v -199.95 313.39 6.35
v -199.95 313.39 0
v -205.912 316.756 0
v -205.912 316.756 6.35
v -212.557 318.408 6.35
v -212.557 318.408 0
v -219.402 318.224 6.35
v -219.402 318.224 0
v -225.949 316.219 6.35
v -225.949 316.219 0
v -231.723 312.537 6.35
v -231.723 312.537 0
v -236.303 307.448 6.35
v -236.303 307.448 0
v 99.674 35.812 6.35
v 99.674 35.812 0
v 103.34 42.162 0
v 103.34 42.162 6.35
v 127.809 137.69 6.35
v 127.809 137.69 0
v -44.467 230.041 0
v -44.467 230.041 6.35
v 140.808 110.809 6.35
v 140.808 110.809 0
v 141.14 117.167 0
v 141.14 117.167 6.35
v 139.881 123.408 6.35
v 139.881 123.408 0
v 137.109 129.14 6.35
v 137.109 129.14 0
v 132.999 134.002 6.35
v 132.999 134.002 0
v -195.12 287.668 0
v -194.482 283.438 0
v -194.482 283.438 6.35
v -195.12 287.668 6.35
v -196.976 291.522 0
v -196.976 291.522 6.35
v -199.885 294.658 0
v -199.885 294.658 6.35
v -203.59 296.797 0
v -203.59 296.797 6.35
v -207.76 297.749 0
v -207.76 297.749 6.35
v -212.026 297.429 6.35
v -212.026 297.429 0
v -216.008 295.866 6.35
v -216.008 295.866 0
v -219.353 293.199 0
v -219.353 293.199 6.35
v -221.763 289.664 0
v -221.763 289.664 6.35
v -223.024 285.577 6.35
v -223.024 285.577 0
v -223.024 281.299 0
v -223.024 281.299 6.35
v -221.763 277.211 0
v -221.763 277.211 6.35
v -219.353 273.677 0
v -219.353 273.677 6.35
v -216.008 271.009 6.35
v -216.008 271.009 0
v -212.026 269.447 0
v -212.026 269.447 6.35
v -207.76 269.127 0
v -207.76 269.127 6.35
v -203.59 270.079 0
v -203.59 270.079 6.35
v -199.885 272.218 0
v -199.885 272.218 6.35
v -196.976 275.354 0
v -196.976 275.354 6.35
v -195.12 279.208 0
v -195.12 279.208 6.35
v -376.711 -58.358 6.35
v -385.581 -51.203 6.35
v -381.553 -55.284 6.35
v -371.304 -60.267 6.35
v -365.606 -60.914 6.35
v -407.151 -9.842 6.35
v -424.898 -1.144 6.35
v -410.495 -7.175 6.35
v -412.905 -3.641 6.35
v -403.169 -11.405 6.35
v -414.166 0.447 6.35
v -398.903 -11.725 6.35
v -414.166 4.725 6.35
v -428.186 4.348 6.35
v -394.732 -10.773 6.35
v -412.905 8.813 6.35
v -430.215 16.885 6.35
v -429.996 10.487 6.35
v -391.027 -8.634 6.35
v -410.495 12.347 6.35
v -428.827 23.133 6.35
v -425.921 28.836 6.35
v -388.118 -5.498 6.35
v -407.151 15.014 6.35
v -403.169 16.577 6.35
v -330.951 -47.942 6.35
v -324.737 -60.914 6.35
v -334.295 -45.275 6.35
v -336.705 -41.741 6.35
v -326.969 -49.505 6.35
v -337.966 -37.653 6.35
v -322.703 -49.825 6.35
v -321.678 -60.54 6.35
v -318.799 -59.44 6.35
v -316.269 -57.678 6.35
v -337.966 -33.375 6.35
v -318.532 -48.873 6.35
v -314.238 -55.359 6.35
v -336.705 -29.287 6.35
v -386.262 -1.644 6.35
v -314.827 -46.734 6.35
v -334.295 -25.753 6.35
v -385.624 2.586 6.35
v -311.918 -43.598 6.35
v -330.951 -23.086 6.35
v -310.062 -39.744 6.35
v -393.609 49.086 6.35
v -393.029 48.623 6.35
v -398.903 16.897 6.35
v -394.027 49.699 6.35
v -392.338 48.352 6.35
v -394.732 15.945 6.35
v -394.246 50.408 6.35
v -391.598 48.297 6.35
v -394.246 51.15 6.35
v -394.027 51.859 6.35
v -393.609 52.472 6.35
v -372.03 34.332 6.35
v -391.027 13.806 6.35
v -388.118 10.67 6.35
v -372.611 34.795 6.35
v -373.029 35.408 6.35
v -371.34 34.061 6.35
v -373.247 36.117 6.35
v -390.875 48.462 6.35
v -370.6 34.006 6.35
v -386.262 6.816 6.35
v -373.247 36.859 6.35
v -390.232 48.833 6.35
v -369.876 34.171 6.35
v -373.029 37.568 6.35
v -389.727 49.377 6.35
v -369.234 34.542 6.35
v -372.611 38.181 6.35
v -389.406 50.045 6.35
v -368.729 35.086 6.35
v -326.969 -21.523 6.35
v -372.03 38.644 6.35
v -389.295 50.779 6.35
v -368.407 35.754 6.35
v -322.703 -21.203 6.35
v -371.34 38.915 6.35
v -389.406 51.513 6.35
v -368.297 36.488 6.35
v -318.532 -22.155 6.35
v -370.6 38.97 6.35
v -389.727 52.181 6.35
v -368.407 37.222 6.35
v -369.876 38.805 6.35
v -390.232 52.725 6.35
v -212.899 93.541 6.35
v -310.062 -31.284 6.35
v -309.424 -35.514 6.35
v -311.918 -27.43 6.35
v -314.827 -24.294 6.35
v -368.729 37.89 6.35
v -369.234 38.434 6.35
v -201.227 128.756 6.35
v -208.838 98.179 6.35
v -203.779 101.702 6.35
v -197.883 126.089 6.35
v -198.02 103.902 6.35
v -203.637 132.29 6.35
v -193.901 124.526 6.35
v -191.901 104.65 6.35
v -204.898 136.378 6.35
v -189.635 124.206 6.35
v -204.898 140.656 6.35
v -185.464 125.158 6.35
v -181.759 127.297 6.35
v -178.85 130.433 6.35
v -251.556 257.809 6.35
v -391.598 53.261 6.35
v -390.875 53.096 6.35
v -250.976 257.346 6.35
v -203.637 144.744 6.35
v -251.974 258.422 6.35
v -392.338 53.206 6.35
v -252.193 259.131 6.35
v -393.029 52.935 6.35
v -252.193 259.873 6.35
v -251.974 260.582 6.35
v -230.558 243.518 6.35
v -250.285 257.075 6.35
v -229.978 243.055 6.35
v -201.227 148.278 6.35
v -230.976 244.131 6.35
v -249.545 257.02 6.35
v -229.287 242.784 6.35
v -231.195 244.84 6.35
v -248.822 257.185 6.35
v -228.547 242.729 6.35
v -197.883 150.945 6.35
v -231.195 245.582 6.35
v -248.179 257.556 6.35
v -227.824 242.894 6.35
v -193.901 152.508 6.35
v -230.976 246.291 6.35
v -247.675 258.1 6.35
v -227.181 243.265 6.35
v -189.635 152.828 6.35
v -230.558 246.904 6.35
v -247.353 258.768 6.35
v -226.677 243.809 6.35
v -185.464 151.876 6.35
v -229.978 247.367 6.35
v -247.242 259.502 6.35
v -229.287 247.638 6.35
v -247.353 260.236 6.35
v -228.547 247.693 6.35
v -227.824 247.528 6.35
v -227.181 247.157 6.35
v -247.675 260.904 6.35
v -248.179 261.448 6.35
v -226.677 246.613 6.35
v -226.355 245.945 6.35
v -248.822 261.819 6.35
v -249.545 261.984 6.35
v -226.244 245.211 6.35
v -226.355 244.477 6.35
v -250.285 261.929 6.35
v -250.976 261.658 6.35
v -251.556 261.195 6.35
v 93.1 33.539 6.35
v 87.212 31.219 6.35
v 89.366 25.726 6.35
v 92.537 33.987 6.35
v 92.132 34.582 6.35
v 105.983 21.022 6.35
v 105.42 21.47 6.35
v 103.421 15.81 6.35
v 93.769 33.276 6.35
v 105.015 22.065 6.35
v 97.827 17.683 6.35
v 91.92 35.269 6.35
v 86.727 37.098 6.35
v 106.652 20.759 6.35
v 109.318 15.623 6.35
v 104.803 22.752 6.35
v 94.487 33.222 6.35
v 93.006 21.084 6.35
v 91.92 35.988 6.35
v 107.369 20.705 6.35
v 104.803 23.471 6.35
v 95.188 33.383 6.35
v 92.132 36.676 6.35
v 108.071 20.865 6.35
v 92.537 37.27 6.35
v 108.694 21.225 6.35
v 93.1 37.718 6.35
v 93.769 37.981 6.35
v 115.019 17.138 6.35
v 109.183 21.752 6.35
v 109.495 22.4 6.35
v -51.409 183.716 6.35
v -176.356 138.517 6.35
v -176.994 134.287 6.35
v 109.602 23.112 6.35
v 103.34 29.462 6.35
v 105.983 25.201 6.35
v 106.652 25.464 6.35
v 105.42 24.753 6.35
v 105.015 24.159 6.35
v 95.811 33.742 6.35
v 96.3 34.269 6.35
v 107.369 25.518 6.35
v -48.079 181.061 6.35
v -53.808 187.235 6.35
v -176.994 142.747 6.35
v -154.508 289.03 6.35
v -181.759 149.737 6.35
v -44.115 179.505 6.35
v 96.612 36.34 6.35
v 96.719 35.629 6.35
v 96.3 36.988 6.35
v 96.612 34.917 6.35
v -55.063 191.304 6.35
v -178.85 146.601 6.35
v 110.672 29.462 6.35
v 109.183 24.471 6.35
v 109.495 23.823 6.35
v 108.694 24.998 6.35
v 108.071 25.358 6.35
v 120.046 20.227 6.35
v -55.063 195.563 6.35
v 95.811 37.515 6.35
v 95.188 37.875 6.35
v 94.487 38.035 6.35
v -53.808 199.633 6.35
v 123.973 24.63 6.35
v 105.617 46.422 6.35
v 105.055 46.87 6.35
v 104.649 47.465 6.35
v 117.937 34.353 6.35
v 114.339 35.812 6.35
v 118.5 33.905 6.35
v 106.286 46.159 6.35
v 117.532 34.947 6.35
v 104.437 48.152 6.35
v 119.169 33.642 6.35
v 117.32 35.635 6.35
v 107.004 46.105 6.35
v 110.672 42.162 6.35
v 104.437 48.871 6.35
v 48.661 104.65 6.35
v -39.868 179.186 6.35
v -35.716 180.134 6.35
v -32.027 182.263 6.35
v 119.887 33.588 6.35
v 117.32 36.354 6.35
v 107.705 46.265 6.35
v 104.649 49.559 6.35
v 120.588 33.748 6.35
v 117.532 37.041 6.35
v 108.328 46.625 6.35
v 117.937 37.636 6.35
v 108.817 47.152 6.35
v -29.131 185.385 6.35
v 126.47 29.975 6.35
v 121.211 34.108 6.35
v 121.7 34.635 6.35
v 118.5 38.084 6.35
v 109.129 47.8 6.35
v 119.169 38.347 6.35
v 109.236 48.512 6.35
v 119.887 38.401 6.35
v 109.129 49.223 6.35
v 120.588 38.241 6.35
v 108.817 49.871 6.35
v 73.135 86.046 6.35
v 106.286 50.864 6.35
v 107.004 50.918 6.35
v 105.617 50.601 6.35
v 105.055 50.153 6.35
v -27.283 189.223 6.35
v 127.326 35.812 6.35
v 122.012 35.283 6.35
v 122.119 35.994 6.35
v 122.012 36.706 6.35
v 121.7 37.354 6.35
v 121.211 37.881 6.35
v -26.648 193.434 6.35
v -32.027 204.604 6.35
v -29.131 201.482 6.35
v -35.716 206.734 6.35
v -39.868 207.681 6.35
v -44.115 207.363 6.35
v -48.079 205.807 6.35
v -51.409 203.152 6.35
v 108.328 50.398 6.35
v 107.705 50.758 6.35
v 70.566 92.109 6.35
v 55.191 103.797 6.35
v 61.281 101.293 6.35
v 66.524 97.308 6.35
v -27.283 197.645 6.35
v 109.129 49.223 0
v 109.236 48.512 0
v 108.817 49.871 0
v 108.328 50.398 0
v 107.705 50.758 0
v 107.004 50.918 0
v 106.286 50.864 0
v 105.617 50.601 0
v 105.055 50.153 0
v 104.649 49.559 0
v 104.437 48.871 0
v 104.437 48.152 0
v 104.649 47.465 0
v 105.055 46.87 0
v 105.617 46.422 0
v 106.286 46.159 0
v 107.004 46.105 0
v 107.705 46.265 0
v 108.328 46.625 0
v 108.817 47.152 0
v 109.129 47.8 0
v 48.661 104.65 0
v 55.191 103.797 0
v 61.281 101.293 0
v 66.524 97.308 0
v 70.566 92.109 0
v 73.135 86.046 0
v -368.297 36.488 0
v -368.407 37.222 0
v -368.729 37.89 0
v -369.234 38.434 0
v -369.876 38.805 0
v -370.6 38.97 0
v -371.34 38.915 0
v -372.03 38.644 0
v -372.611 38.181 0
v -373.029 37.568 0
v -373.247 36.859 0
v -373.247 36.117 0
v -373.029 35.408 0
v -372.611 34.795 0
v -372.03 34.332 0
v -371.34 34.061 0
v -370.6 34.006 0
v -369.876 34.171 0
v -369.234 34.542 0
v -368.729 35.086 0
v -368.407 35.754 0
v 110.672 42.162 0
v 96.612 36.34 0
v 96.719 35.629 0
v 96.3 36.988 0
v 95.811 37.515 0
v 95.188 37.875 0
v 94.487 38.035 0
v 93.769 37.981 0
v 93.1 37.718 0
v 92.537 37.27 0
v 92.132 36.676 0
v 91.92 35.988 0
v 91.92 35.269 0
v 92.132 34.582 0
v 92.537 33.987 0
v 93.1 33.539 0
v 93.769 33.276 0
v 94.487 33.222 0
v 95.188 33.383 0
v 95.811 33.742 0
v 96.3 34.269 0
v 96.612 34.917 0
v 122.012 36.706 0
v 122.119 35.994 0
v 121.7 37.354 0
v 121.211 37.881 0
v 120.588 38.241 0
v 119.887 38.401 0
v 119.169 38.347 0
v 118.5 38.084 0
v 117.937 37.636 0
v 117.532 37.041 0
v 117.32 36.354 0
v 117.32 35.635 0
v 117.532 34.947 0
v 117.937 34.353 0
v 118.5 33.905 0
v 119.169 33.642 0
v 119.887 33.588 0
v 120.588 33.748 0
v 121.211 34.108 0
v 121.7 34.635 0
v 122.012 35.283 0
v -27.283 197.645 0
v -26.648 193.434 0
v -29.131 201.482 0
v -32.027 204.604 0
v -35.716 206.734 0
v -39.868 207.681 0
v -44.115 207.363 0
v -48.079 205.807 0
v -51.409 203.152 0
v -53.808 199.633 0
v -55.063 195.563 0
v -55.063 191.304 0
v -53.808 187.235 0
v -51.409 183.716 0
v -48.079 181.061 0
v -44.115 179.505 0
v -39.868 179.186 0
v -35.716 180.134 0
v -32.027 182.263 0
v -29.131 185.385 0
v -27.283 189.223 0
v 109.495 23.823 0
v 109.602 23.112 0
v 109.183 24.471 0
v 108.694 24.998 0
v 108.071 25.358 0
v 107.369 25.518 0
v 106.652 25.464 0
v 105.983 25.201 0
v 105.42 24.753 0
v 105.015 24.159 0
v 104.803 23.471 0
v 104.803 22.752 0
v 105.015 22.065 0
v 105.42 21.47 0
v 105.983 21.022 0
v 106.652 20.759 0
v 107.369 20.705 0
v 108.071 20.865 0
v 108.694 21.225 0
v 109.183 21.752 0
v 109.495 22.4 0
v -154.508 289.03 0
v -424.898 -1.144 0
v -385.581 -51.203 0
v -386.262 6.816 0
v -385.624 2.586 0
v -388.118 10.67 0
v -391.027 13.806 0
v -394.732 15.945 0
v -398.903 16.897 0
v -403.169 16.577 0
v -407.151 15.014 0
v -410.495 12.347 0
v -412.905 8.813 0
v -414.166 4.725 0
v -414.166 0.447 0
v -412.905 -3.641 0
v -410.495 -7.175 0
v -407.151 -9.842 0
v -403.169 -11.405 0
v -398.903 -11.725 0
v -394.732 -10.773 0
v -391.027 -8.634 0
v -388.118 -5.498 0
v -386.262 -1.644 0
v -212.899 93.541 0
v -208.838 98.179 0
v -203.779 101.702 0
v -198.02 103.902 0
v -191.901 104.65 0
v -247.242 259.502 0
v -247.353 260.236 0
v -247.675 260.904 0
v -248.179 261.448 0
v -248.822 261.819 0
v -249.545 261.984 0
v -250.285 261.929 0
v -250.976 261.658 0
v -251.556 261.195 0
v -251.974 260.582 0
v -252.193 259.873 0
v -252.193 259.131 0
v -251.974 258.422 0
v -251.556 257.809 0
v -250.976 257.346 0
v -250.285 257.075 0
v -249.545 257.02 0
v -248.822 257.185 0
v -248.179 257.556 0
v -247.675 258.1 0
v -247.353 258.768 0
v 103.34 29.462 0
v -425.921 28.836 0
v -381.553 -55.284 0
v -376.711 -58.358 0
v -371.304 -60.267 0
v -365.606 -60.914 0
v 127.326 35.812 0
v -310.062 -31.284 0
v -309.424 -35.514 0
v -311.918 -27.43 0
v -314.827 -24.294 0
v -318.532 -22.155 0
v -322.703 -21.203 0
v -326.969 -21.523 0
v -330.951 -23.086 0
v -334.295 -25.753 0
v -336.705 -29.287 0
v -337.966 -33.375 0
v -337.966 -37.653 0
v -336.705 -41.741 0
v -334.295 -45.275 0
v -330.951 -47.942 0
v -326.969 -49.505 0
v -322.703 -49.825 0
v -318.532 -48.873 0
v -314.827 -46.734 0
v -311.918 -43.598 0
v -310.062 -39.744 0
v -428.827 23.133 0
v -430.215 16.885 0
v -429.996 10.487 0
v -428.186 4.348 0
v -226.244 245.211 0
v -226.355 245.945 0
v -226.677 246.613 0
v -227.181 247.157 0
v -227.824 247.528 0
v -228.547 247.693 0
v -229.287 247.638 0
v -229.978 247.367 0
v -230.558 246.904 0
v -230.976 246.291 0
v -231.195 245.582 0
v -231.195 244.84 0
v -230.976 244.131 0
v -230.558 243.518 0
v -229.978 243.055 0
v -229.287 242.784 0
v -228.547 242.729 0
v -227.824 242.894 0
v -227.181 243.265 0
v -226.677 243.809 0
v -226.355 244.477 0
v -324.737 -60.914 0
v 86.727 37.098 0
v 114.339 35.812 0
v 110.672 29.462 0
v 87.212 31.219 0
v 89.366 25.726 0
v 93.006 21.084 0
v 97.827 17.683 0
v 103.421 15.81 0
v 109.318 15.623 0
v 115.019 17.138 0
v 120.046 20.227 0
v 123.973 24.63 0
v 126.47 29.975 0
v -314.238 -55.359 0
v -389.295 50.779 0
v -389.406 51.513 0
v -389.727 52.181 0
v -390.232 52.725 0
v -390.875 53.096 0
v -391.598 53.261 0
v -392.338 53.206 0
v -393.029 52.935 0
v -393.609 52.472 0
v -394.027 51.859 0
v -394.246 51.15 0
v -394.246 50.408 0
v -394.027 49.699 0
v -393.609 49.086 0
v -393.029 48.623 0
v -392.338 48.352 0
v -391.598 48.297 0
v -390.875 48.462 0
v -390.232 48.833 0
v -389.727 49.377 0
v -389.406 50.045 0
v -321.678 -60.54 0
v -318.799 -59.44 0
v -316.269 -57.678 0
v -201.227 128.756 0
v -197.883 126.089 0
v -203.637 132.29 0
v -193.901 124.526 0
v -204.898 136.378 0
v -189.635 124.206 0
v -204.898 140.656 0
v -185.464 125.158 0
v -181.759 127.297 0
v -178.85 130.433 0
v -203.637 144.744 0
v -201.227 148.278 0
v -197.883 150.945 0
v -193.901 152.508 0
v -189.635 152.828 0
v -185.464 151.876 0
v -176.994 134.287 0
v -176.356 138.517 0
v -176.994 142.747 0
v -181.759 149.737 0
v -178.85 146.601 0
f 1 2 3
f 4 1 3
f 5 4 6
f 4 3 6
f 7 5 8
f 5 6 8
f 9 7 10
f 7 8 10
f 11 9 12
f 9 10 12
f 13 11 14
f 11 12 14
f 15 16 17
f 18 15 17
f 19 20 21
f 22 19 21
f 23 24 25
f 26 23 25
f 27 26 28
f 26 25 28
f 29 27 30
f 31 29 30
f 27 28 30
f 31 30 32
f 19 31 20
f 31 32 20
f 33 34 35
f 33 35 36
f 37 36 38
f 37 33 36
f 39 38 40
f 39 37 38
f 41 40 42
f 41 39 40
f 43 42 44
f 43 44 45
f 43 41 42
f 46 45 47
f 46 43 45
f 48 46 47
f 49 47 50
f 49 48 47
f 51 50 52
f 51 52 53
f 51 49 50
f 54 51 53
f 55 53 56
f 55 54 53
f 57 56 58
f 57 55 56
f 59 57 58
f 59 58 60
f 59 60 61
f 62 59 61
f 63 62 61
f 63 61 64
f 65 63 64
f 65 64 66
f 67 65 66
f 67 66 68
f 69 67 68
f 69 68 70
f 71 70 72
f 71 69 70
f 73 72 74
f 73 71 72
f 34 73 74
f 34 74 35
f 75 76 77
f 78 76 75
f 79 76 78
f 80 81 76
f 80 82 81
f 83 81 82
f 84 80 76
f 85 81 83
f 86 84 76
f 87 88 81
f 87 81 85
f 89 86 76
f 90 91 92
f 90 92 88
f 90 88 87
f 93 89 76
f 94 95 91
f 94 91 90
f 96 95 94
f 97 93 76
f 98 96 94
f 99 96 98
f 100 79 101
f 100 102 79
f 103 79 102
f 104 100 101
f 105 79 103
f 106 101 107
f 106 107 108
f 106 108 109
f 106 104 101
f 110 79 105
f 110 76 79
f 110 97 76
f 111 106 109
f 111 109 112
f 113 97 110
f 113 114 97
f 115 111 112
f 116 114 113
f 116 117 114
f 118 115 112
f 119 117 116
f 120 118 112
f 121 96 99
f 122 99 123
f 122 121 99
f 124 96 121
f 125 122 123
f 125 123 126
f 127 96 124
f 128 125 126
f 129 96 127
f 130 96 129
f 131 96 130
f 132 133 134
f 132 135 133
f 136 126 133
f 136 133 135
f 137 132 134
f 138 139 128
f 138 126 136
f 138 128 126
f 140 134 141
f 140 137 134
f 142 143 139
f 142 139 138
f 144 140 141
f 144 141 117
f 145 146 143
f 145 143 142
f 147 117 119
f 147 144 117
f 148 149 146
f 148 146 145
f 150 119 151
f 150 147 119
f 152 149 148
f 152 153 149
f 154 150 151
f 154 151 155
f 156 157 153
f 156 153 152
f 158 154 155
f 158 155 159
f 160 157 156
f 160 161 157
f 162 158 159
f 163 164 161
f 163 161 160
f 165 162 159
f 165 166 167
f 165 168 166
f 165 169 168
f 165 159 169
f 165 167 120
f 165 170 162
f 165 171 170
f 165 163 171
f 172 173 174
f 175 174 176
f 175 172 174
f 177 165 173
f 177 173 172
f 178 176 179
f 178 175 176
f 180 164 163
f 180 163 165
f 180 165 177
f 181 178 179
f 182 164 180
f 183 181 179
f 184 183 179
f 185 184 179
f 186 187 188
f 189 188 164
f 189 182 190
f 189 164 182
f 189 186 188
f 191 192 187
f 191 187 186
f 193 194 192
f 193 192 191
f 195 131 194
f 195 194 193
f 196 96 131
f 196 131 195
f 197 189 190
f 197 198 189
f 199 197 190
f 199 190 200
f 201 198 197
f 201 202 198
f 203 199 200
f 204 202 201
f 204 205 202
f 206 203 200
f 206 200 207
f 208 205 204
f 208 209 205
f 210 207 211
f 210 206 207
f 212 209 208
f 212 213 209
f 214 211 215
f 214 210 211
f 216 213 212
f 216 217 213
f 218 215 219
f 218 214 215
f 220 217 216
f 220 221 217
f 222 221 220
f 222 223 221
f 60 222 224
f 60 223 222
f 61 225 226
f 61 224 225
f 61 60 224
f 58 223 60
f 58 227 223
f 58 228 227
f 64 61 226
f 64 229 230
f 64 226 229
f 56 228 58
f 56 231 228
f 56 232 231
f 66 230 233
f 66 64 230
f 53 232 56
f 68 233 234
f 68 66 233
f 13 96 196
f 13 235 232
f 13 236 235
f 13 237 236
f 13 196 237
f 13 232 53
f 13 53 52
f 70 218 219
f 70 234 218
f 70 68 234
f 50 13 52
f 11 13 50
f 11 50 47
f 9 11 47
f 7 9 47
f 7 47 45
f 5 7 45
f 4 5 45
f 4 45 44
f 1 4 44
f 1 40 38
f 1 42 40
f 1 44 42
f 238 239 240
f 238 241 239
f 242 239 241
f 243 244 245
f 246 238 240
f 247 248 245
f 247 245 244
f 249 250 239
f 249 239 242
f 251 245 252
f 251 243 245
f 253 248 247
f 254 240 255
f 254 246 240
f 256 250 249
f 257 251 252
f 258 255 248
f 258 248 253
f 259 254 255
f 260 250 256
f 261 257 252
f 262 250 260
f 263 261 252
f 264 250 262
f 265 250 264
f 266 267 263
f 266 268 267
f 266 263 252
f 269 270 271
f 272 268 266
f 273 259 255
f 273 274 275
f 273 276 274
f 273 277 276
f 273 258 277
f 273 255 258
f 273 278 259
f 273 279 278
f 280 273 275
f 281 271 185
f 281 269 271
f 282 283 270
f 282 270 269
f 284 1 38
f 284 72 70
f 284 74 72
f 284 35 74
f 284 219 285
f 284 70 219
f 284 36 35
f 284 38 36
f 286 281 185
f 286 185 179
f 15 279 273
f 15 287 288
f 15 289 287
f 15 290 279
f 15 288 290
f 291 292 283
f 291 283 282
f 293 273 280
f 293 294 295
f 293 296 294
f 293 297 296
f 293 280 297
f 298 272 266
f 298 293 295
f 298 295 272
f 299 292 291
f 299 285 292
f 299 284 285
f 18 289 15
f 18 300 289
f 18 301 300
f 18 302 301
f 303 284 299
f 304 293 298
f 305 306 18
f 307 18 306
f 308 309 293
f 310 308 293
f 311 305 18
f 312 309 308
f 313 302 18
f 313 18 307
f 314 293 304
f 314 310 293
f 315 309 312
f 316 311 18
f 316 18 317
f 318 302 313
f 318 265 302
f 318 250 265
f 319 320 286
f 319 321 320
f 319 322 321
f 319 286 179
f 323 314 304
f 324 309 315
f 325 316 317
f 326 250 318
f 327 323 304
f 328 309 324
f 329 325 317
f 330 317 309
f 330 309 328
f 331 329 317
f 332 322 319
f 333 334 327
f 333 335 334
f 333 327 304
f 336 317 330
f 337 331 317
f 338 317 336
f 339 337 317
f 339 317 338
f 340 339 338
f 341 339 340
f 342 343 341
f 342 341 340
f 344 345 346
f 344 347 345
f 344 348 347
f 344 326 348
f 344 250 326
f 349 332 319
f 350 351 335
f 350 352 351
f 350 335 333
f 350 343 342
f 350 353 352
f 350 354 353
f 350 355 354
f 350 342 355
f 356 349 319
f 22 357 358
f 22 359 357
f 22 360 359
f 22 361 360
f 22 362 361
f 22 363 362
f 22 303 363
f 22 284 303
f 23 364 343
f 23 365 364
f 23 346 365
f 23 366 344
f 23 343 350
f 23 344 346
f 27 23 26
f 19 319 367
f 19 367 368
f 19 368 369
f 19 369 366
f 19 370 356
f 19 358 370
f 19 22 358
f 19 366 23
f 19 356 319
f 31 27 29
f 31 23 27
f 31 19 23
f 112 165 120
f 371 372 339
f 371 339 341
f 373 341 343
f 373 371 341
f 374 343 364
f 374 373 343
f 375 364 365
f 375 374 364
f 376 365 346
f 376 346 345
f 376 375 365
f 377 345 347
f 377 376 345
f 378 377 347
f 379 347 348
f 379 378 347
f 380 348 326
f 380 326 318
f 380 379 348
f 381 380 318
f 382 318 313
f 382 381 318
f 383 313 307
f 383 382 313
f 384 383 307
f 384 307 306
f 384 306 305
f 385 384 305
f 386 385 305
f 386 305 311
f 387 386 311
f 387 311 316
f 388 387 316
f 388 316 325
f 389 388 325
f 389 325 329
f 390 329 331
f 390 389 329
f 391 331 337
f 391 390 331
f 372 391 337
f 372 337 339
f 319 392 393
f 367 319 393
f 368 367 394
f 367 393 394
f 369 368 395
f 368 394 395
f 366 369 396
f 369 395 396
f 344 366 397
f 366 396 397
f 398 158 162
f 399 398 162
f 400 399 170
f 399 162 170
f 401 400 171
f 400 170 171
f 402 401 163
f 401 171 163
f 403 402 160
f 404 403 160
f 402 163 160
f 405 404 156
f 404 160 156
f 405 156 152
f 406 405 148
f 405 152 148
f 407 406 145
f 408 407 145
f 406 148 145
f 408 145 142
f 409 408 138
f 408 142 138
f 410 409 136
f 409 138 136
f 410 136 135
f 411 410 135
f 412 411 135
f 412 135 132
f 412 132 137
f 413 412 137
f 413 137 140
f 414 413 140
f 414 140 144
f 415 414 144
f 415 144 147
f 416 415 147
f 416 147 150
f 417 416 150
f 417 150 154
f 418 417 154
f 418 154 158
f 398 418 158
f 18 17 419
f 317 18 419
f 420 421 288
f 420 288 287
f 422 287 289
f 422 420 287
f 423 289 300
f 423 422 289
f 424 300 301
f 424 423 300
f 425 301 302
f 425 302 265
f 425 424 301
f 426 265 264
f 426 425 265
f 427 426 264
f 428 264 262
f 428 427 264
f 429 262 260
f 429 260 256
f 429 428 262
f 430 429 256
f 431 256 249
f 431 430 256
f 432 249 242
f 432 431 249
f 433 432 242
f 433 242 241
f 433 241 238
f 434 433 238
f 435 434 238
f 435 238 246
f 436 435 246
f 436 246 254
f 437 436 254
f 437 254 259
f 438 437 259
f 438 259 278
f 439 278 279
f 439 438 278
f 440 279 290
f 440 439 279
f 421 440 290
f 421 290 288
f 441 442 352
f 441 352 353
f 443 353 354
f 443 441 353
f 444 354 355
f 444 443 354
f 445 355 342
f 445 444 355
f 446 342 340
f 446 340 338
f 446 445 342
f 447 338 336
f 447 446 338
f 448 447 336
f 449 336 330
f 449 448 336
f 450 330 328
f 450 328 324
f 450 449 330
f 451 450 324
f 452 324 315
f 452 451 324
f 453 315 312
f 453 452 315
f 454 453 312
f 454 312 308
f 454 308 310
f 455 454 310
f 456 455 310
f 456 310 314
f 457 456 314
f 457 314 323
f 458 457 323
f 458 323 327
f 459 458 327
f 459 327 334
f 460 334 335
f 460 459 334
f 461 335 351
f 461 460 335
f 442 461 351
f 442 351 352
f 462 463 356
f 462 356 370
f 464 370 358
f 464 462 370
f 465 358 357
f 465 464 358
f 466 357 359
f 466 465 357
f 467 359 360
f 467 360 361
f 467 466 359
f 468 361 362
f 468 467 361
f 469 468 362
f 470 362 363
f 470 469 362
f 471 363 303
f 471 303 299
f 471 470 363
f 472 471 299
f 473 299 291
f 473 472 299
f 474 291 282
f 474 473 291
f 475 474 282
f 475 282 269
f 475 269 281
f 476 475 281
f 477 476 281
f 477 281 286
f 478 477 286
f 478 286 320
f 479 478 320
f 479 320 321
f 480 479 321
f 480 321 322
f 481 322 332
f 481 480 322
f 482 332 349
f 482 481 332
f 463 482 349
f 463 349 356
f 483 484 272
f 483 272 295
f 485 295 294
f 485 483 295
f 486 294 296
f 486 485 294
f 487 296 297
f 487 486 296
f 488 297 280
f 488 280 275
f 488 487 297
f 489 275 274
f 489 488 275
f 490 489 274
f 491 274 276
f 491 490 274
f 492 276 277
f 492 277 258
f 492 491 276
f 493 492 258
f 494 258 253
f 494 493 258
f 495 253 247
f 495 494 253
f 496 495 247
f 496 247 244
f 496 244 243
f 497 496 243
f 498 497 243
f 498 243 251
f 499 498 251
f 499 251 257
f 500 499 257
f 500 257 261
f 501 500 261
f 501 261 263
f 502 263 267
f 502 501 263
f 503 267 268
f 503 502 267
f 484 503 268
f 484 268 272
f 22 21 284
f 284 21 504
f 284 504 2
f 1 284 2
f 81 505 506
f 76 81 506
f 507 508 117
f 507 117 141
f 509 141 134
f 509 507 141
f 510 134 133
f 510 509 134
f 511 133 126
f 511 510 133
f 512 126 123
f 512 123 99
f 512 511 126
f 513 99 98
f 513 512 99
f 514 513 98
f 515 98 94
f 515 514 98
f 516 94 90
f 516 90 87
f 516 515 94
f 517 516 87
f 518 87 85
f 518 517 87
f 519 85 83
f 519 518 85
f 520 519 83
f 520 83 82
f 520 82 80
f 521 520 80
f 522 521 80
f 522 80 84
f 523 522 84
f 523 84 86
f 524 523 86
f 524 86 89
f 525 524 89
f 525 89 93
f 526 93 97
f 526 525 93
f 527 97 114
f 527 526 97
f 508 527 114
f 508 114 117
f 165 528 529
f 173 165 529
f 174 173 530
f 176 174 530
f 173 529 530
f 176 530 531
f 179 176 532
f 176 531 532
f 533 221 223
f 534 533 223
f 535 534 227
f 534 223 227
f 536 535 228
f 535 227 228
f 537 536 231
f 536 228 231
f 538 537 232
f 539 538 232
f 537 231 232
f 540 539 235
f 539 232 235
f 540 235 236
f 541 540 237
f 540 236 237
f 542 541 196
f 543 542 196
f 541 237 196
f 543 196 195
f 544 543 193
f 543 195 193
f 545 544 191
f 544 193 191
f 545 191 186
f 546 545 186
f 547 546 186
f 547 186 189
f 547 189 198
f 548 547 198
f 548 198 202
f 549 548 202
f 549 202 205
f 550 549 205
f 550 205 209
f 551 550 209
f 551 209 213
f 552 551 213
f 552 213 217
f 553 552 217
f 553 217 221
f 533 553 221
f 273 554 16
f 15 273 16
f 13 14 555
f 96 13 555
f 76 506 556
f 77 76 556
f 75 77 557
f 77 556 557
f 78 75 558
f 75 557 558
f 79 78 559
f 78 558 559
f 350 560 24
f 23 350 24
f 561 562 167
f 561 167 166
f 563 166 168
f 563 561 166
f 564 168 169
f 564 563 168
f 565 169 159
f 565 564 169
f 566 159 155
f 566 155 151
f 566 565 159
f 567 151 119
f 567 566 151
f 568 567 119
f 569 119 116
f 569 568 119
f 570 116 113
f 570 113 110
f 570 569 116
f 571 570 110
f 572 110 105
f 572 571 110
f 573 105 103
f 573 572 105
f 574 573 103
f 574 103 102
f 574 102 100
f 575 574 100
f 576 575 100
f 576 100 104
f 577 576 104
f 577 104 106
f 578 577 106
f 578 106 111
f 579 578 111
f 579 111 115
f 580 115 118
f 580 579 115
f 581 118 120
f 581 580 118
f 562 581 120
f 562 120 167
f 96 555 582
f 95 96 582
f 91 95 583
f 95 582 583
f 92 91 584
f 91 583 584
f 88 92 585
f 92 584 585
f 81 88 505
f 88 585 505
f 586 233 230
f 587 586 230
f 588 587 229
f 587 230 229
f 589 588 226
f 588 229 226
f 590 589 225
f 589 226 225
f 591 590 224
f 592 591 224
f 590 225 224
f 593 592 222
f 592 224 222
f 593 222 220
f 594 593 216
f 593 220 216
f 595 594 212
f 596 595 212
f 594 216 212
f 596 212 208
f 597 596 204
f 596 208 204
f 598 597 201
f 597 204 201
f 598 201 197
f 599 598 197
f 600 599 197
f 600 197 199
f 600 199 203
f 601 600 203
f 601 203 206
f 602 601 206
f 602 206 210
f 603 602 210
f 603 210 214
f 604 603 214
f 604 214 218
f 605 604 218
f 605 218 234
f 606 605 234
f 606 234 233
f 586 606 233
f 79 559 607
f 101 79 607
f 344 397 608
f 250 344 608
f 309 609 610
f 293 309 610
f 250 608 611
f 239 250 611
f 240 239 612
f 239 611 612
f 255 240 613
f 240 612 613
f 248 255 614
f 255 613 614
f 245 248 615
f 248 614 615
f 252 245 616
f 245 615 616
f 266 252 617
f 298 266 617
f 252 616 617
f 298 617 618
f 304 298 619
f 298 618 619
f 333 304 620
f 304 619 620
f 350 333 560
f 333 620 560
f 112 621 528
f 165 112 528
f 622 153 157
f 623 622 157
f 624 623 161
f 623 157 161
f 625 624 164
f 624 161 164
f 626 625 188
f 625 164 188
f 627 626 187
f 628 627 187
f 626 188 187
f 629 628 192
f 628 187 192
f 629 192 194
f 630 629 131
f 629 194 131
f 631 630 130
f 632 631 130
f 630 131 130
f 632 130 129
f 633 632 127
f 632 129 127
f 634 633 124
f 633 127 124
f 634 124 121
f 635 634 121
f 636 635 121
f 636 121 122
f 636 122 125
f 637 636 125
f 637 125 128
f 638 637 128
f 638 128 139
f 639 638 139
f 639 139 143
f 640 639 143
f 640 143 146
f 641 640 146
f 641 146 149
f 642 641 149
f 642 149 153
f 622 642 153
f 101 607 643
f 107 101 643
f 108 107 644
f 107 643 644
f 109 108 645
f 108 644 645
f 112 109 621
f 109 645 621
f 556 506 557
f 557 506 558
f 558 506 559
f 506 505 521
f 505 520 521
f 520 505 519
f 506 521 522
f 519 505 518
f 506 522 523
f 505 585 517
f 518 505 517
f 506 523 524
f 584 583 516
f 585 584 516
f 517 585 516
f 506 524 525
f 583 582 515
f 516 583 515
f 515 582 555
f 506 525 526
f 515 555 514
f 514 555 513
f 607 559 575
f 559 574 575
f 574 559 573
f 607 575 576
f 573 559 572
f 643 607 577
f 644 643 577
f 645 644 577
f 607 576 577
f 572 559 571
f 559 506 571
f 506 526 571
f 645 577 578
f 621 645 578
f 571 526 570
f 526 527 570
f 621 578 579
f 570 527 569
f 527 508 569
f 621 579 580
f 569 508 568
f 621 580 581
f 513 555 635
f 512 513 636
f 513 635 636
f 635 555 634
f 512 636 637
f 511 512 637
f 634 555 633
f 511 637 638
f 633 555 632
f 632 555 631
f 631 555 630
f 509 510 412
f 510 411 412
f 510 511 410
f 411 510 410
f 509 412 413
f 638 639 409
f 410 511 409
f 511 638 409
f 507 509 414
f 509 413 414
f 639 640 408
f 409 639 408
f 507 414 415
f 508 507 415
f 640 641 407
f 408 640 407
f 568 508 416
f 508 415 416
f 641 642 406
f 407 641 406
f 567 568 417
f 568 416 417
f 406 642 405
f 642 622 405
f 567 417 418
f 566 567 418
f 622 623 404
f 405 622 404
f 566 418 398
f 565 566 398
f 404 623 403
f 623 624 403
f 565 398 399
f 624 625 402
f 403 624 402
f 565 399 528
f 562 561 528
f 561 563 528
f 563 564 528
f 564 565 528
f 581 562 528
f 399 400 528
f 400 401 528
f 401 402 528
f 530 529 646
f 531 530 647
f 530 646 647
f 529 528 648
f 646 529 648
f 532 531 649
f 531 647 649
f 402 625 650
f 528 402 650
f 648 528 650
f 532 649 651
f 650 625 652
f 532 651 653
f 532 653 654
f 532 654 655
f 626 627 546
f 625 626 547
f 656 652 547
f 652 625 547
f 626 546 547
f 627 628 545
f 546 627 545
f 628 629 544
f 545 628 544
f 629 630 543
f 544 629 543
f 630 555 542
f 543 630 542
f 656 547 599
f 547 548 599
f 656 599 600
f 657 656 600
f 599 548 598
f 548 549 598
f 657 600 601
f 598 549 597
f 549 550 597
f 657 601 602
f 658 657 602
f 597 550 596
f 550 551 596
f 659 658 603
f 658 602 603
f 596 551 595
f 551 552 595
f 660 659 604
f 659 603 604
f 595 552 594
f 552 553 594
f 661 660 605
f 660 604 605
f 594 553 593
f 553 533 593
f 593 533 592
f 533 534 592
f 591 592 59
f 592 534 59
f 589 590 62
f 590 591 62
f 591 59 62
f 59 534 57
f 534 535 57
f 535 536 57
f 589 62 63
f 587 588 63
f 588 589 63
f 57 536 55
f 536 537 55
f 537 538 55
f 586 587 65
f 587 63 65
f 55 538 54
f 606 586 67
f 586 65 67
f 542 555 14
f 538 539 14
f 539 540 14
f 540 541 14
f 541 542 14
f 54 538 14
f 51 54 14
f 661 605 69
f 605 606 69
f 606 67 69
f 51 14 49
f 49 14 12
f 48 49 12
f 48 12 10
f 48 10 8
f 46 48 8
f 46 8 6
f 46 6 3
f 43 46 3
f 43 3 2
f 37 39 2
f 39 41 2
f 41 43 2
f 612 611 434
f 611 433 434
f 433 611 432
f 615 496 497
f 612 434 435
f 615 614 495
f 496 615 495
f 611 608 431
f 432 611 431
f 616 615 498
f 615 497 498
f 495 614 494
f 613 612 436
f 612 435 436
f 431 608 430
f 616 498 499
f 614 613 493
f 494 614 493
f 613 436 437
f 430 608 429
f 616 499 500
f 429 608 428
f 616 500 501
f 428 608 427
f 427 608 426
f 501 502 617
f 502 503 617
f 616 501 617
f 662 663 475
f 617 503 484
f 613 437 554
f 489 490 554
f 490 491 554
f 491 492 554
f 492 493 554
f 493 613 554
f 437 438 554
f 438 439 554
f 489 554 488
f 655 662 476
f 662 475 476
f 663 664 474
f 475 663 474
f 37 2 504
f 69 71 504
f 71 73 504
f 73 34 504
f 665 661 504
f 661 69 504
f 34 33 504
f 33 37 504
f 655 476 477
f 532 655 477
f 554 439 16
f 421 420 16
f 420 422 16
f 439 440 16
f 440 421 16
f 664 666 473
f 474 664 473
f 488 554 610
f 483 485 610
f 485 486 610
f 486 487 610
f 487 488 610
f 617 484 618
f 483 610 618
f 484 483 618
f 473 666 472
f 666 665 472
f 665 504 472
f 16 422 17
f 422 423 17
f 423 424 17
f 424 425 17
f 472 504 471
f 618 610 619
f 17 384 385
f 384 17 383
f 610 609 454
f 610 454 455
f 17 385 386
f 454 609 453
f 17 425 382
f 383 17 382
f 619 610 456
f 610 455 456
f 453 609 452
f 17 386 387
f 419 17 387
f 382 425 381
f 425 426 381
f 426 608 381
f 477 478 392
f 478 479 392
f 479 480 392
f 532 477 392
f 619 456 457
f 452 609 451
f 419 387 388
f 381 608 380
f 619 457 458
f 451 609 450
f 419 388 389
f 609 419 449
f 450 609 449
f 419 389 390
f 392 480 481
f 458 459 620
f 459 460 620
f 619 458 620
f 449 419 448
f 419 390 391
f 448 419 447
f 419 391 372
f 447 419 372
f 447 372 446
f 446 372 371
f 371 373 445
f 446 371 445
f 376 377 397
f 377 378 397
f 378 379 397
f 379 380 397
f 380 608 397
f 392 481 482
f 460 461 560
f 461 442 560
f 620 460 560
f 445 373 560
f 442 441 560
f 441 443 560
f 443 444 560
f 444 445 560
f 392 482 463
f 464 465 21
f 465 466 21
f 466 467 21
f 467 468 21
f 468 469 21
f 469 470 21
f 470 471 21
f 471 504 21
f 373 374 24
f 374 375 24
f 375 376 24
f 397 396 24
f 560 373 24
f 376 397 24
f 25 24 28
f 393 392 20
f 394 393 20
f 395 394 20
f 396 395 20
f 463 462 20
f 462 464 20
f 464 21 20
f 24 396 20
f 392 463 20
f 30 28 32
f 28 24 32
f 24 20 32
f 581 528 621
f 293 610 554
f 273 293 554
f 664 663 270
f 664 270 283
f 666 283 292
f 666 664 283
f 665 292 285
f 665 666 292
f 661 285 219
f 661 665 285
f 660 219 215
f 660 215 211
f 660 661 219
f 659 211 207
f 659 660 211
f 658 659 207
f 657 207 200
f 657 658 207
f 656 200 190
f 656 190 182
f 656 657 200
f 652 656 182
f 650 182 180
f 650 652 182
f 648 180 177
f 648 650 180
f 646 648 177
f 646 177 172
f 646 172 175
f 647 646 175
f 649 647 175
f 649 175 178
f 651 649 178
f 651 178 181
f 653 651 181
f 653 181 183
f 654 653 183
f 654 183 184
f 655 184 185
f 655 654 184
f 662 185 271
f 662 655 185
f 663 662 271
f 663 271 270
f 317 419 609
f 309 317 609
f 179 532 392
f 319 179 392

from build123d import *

# Parameters (mm, degrees)
MODEL_R             = 14.351
MODEL_R_2           = 2.413
MODEL_R_3           = 14.2875
BOSS_EXTRUDE1_DEPTH = 6.35
CUT_EXTRUDE1_REACH  = 8.35
SKETCH35_R          = 2.4892


with BuildPart() as part:
    # Model → Boss-Extrude1 (new body)
    with BuildSketch(Plane.XY):
        with BuildLine():
            ThreePointArc((-212.899365952, 93.541257838), (-203.778989185, 101.701881024), (-191.901103209, 104.650248016))
            Line((-191.901103209, 104.650248016), (48.661197018, 104.650248016))
            ThreePointArc((48.661197018, 104.650248016), (64.032332507, 99.471232012), (73.135172194, 86.046168785))
            Line((73.135172194, 86.046168785), (86.727013732, 37.098218434))
            ThreePointArc((86.727013732, 37.098218434), (106.36258142, 15.501750179), (127.326236921, 35.811553418))
            Line((127.326236921, 35.811553418), (140.807890588, 110.809453484))
            ThreePointArc((140.807890588, 110.809453484), (138.675228362, 126.361225539), (127.809114585, 137.689660276))
            Line((127.809114585, 137.689660276), (-44.466784077, 230.040741354))
            Line((-44.466784077, 230.040741354), (-154.507929168, 289.02994873))
            Line((-154.507929168, 289.02994873), (-199.949582693, 313.389629113))
            ThreePointArc((-199.949582693, 313.389629113), (-219.402189514, 318.224062751), (-236.303247901, 307.447705012))
            Line((-236.303247901, 307.447705012), (-425.920878295, 28.83612519))
            ThreePointArc((-425.920878295, 28.83612519), (-430.307847502, 13.679090678), (-424.898106806, -1.143726181))
            Line((-424.898106806, -1.143726181), (-385.58146606, -51.20282143))
            ThreePointArc((-385.58146606, -51.20282143), (-376.71145599, -58.357541068), (-365.605974805, -60.913979882))
            Line((-365.605974805, -60.913979882), (-324.737451002, -60.913979882))
            ThreePointArc((-324.737451002, -60.913979882), (-318.798508014, -59.439796386), (-314.23831963, -55.359484793))
            Line((-314.23831963, -55.359484793), (-212.899365952, 93.541257838))
        make_face()
        with Locations((-323.775189267, -35.513979882)):
            Circle(MODEL_R, mode=Mode.SUBTRACT)
        with Locations((-399.975189267, 2.586020118)):
            Circle(MODEL_R, mode=Mode.SUBTRACT)
        with Locations((107.189078625, 23.111553418)):
            Circle(MODEL_R_2, mode=Mode.SUBTRACT)
        with Locations((94.306236921, 35.628711714)):
            Circle(MODEL_R_2, mode=Mode.SUBTRACT)
        Polygon((110.67241113, 42.161553418), (114.338585339, 35.811553418), (110.67241113, 29.461553418), (103.340062711, 29.461553418), (99.673888502, 35.811553418), (103.340062711, 42.161553418), (106.823395217, 42.161553418), align=None, mode=Mode.SUBTRACT)
        with Locations((119.706236921, 35.994395122)):
            Circle(MODEL_R_2, mode=Mode.SUBTRACT)
        with Locations((106.823395217, 48.511553418)):
            Circle(MODEL_R_2, mode=Mode.SUBTRACT)
        with Locations((-190.707148919, 138.516914683)):
            Circle(MODEL_R, mode=Mode.SUBTRACT)
        with Locations((-208.832932893, 283.437784316)):
            Circle(MODEL_R, mode=Mode.SUBTRACT)
        with Locations((-40.935516122, 193.433854171)):
            Circle(MODEL_R_3, mode=Mode.SUBTRACT)
    extrude(amount=BOSS_EXTRUDE1_DEPTH)

    # Sketch35 → Cut-Extrude1 (cut, up to next)
    with BuildSketch(Plane.XY.offset(6.35), mode=Mode.PRIVATE) as cut_extrude1_sk1:
        with Locations((-391.784122689, 50.779120634)):
            Circle(SKETCH35_R)
    cut_extrude1_tool1 = extrude(cut_extrude1_sk1.sketch, amount=-CUT_EXTRUDE1_REACH, mode=Mode.PRIVATE) & part.part
    add(cut_extrude1_tool1.solids().sort_by_distance((-391.784123, 50.779121, 6.35))[0], mode=Mode.SUBTRACT)
    # Sketch35 → Cut-Extrude1 (cut, up to next)
    with BuildSketch(Plane.XY.offset(6.35), mode=Mode.PRIVATE) as cut_extrude1_sk2:
        with Locations((-249.731485055, 259.501852308)):
            Circle(SKETCH35_R)
    cut_extrude1_tool2 = extrude(cut_extrude1_sk2.sketch, amount=-CUT_EXTRUDE1_REACH, mode=Mode.PRIVATE) & part.part
    add(cut_extrude1_tool2.solids().sort_by_distance((-249.731485, 259.501852, 6.35))[0], mode=Mode.SUBTRACT)
    # Sketch35 → Cut-Extrude1 (cut, up to next)
    with BuildSketch(Plane.XY.offset(6.35), mode=Mode.PRIVATE) as cut_extrude1_sk3:
        with Locations((-228.733222311, 245.210842485)):
            Circle(SKETCH35_R)
    cut_extrude1_tool3 = extrude(cut_extrude1_sk3.sketch, amount=-CUT_EXTRUDE1_REACH, mode=Mode.PRIVATE) & part.part
    add(cut_extrude1_tool3.solids().sort_by_distance((-228.733222, 245.210842, 6.35))[0], mode=Mode.SUBTRACT)
    # Sketch35 → Cut-Extrude1 (cut, up to next)
    with BuildSketch(Plane.XY.offset(6.35), mode=Mode.PRIVATE) as cut_extrude1_sk4:
        with Locations((-370.785859945, 36.488110812)):
            Circle(SKETCH35_R)
    cut_extrude1_tool4 = extrude(cut_extrude1_sk4.sketch, amount=-CUT_EXTRUDE1_REACH, mode=Mode.PRIVATE) & part.part
    add(cut_extrude1_tool4.solids().sort_by_distance((-370.78586, 36.488111, 6.35))[0], mode=Mode.SUBTRACT)


solid = part.part
